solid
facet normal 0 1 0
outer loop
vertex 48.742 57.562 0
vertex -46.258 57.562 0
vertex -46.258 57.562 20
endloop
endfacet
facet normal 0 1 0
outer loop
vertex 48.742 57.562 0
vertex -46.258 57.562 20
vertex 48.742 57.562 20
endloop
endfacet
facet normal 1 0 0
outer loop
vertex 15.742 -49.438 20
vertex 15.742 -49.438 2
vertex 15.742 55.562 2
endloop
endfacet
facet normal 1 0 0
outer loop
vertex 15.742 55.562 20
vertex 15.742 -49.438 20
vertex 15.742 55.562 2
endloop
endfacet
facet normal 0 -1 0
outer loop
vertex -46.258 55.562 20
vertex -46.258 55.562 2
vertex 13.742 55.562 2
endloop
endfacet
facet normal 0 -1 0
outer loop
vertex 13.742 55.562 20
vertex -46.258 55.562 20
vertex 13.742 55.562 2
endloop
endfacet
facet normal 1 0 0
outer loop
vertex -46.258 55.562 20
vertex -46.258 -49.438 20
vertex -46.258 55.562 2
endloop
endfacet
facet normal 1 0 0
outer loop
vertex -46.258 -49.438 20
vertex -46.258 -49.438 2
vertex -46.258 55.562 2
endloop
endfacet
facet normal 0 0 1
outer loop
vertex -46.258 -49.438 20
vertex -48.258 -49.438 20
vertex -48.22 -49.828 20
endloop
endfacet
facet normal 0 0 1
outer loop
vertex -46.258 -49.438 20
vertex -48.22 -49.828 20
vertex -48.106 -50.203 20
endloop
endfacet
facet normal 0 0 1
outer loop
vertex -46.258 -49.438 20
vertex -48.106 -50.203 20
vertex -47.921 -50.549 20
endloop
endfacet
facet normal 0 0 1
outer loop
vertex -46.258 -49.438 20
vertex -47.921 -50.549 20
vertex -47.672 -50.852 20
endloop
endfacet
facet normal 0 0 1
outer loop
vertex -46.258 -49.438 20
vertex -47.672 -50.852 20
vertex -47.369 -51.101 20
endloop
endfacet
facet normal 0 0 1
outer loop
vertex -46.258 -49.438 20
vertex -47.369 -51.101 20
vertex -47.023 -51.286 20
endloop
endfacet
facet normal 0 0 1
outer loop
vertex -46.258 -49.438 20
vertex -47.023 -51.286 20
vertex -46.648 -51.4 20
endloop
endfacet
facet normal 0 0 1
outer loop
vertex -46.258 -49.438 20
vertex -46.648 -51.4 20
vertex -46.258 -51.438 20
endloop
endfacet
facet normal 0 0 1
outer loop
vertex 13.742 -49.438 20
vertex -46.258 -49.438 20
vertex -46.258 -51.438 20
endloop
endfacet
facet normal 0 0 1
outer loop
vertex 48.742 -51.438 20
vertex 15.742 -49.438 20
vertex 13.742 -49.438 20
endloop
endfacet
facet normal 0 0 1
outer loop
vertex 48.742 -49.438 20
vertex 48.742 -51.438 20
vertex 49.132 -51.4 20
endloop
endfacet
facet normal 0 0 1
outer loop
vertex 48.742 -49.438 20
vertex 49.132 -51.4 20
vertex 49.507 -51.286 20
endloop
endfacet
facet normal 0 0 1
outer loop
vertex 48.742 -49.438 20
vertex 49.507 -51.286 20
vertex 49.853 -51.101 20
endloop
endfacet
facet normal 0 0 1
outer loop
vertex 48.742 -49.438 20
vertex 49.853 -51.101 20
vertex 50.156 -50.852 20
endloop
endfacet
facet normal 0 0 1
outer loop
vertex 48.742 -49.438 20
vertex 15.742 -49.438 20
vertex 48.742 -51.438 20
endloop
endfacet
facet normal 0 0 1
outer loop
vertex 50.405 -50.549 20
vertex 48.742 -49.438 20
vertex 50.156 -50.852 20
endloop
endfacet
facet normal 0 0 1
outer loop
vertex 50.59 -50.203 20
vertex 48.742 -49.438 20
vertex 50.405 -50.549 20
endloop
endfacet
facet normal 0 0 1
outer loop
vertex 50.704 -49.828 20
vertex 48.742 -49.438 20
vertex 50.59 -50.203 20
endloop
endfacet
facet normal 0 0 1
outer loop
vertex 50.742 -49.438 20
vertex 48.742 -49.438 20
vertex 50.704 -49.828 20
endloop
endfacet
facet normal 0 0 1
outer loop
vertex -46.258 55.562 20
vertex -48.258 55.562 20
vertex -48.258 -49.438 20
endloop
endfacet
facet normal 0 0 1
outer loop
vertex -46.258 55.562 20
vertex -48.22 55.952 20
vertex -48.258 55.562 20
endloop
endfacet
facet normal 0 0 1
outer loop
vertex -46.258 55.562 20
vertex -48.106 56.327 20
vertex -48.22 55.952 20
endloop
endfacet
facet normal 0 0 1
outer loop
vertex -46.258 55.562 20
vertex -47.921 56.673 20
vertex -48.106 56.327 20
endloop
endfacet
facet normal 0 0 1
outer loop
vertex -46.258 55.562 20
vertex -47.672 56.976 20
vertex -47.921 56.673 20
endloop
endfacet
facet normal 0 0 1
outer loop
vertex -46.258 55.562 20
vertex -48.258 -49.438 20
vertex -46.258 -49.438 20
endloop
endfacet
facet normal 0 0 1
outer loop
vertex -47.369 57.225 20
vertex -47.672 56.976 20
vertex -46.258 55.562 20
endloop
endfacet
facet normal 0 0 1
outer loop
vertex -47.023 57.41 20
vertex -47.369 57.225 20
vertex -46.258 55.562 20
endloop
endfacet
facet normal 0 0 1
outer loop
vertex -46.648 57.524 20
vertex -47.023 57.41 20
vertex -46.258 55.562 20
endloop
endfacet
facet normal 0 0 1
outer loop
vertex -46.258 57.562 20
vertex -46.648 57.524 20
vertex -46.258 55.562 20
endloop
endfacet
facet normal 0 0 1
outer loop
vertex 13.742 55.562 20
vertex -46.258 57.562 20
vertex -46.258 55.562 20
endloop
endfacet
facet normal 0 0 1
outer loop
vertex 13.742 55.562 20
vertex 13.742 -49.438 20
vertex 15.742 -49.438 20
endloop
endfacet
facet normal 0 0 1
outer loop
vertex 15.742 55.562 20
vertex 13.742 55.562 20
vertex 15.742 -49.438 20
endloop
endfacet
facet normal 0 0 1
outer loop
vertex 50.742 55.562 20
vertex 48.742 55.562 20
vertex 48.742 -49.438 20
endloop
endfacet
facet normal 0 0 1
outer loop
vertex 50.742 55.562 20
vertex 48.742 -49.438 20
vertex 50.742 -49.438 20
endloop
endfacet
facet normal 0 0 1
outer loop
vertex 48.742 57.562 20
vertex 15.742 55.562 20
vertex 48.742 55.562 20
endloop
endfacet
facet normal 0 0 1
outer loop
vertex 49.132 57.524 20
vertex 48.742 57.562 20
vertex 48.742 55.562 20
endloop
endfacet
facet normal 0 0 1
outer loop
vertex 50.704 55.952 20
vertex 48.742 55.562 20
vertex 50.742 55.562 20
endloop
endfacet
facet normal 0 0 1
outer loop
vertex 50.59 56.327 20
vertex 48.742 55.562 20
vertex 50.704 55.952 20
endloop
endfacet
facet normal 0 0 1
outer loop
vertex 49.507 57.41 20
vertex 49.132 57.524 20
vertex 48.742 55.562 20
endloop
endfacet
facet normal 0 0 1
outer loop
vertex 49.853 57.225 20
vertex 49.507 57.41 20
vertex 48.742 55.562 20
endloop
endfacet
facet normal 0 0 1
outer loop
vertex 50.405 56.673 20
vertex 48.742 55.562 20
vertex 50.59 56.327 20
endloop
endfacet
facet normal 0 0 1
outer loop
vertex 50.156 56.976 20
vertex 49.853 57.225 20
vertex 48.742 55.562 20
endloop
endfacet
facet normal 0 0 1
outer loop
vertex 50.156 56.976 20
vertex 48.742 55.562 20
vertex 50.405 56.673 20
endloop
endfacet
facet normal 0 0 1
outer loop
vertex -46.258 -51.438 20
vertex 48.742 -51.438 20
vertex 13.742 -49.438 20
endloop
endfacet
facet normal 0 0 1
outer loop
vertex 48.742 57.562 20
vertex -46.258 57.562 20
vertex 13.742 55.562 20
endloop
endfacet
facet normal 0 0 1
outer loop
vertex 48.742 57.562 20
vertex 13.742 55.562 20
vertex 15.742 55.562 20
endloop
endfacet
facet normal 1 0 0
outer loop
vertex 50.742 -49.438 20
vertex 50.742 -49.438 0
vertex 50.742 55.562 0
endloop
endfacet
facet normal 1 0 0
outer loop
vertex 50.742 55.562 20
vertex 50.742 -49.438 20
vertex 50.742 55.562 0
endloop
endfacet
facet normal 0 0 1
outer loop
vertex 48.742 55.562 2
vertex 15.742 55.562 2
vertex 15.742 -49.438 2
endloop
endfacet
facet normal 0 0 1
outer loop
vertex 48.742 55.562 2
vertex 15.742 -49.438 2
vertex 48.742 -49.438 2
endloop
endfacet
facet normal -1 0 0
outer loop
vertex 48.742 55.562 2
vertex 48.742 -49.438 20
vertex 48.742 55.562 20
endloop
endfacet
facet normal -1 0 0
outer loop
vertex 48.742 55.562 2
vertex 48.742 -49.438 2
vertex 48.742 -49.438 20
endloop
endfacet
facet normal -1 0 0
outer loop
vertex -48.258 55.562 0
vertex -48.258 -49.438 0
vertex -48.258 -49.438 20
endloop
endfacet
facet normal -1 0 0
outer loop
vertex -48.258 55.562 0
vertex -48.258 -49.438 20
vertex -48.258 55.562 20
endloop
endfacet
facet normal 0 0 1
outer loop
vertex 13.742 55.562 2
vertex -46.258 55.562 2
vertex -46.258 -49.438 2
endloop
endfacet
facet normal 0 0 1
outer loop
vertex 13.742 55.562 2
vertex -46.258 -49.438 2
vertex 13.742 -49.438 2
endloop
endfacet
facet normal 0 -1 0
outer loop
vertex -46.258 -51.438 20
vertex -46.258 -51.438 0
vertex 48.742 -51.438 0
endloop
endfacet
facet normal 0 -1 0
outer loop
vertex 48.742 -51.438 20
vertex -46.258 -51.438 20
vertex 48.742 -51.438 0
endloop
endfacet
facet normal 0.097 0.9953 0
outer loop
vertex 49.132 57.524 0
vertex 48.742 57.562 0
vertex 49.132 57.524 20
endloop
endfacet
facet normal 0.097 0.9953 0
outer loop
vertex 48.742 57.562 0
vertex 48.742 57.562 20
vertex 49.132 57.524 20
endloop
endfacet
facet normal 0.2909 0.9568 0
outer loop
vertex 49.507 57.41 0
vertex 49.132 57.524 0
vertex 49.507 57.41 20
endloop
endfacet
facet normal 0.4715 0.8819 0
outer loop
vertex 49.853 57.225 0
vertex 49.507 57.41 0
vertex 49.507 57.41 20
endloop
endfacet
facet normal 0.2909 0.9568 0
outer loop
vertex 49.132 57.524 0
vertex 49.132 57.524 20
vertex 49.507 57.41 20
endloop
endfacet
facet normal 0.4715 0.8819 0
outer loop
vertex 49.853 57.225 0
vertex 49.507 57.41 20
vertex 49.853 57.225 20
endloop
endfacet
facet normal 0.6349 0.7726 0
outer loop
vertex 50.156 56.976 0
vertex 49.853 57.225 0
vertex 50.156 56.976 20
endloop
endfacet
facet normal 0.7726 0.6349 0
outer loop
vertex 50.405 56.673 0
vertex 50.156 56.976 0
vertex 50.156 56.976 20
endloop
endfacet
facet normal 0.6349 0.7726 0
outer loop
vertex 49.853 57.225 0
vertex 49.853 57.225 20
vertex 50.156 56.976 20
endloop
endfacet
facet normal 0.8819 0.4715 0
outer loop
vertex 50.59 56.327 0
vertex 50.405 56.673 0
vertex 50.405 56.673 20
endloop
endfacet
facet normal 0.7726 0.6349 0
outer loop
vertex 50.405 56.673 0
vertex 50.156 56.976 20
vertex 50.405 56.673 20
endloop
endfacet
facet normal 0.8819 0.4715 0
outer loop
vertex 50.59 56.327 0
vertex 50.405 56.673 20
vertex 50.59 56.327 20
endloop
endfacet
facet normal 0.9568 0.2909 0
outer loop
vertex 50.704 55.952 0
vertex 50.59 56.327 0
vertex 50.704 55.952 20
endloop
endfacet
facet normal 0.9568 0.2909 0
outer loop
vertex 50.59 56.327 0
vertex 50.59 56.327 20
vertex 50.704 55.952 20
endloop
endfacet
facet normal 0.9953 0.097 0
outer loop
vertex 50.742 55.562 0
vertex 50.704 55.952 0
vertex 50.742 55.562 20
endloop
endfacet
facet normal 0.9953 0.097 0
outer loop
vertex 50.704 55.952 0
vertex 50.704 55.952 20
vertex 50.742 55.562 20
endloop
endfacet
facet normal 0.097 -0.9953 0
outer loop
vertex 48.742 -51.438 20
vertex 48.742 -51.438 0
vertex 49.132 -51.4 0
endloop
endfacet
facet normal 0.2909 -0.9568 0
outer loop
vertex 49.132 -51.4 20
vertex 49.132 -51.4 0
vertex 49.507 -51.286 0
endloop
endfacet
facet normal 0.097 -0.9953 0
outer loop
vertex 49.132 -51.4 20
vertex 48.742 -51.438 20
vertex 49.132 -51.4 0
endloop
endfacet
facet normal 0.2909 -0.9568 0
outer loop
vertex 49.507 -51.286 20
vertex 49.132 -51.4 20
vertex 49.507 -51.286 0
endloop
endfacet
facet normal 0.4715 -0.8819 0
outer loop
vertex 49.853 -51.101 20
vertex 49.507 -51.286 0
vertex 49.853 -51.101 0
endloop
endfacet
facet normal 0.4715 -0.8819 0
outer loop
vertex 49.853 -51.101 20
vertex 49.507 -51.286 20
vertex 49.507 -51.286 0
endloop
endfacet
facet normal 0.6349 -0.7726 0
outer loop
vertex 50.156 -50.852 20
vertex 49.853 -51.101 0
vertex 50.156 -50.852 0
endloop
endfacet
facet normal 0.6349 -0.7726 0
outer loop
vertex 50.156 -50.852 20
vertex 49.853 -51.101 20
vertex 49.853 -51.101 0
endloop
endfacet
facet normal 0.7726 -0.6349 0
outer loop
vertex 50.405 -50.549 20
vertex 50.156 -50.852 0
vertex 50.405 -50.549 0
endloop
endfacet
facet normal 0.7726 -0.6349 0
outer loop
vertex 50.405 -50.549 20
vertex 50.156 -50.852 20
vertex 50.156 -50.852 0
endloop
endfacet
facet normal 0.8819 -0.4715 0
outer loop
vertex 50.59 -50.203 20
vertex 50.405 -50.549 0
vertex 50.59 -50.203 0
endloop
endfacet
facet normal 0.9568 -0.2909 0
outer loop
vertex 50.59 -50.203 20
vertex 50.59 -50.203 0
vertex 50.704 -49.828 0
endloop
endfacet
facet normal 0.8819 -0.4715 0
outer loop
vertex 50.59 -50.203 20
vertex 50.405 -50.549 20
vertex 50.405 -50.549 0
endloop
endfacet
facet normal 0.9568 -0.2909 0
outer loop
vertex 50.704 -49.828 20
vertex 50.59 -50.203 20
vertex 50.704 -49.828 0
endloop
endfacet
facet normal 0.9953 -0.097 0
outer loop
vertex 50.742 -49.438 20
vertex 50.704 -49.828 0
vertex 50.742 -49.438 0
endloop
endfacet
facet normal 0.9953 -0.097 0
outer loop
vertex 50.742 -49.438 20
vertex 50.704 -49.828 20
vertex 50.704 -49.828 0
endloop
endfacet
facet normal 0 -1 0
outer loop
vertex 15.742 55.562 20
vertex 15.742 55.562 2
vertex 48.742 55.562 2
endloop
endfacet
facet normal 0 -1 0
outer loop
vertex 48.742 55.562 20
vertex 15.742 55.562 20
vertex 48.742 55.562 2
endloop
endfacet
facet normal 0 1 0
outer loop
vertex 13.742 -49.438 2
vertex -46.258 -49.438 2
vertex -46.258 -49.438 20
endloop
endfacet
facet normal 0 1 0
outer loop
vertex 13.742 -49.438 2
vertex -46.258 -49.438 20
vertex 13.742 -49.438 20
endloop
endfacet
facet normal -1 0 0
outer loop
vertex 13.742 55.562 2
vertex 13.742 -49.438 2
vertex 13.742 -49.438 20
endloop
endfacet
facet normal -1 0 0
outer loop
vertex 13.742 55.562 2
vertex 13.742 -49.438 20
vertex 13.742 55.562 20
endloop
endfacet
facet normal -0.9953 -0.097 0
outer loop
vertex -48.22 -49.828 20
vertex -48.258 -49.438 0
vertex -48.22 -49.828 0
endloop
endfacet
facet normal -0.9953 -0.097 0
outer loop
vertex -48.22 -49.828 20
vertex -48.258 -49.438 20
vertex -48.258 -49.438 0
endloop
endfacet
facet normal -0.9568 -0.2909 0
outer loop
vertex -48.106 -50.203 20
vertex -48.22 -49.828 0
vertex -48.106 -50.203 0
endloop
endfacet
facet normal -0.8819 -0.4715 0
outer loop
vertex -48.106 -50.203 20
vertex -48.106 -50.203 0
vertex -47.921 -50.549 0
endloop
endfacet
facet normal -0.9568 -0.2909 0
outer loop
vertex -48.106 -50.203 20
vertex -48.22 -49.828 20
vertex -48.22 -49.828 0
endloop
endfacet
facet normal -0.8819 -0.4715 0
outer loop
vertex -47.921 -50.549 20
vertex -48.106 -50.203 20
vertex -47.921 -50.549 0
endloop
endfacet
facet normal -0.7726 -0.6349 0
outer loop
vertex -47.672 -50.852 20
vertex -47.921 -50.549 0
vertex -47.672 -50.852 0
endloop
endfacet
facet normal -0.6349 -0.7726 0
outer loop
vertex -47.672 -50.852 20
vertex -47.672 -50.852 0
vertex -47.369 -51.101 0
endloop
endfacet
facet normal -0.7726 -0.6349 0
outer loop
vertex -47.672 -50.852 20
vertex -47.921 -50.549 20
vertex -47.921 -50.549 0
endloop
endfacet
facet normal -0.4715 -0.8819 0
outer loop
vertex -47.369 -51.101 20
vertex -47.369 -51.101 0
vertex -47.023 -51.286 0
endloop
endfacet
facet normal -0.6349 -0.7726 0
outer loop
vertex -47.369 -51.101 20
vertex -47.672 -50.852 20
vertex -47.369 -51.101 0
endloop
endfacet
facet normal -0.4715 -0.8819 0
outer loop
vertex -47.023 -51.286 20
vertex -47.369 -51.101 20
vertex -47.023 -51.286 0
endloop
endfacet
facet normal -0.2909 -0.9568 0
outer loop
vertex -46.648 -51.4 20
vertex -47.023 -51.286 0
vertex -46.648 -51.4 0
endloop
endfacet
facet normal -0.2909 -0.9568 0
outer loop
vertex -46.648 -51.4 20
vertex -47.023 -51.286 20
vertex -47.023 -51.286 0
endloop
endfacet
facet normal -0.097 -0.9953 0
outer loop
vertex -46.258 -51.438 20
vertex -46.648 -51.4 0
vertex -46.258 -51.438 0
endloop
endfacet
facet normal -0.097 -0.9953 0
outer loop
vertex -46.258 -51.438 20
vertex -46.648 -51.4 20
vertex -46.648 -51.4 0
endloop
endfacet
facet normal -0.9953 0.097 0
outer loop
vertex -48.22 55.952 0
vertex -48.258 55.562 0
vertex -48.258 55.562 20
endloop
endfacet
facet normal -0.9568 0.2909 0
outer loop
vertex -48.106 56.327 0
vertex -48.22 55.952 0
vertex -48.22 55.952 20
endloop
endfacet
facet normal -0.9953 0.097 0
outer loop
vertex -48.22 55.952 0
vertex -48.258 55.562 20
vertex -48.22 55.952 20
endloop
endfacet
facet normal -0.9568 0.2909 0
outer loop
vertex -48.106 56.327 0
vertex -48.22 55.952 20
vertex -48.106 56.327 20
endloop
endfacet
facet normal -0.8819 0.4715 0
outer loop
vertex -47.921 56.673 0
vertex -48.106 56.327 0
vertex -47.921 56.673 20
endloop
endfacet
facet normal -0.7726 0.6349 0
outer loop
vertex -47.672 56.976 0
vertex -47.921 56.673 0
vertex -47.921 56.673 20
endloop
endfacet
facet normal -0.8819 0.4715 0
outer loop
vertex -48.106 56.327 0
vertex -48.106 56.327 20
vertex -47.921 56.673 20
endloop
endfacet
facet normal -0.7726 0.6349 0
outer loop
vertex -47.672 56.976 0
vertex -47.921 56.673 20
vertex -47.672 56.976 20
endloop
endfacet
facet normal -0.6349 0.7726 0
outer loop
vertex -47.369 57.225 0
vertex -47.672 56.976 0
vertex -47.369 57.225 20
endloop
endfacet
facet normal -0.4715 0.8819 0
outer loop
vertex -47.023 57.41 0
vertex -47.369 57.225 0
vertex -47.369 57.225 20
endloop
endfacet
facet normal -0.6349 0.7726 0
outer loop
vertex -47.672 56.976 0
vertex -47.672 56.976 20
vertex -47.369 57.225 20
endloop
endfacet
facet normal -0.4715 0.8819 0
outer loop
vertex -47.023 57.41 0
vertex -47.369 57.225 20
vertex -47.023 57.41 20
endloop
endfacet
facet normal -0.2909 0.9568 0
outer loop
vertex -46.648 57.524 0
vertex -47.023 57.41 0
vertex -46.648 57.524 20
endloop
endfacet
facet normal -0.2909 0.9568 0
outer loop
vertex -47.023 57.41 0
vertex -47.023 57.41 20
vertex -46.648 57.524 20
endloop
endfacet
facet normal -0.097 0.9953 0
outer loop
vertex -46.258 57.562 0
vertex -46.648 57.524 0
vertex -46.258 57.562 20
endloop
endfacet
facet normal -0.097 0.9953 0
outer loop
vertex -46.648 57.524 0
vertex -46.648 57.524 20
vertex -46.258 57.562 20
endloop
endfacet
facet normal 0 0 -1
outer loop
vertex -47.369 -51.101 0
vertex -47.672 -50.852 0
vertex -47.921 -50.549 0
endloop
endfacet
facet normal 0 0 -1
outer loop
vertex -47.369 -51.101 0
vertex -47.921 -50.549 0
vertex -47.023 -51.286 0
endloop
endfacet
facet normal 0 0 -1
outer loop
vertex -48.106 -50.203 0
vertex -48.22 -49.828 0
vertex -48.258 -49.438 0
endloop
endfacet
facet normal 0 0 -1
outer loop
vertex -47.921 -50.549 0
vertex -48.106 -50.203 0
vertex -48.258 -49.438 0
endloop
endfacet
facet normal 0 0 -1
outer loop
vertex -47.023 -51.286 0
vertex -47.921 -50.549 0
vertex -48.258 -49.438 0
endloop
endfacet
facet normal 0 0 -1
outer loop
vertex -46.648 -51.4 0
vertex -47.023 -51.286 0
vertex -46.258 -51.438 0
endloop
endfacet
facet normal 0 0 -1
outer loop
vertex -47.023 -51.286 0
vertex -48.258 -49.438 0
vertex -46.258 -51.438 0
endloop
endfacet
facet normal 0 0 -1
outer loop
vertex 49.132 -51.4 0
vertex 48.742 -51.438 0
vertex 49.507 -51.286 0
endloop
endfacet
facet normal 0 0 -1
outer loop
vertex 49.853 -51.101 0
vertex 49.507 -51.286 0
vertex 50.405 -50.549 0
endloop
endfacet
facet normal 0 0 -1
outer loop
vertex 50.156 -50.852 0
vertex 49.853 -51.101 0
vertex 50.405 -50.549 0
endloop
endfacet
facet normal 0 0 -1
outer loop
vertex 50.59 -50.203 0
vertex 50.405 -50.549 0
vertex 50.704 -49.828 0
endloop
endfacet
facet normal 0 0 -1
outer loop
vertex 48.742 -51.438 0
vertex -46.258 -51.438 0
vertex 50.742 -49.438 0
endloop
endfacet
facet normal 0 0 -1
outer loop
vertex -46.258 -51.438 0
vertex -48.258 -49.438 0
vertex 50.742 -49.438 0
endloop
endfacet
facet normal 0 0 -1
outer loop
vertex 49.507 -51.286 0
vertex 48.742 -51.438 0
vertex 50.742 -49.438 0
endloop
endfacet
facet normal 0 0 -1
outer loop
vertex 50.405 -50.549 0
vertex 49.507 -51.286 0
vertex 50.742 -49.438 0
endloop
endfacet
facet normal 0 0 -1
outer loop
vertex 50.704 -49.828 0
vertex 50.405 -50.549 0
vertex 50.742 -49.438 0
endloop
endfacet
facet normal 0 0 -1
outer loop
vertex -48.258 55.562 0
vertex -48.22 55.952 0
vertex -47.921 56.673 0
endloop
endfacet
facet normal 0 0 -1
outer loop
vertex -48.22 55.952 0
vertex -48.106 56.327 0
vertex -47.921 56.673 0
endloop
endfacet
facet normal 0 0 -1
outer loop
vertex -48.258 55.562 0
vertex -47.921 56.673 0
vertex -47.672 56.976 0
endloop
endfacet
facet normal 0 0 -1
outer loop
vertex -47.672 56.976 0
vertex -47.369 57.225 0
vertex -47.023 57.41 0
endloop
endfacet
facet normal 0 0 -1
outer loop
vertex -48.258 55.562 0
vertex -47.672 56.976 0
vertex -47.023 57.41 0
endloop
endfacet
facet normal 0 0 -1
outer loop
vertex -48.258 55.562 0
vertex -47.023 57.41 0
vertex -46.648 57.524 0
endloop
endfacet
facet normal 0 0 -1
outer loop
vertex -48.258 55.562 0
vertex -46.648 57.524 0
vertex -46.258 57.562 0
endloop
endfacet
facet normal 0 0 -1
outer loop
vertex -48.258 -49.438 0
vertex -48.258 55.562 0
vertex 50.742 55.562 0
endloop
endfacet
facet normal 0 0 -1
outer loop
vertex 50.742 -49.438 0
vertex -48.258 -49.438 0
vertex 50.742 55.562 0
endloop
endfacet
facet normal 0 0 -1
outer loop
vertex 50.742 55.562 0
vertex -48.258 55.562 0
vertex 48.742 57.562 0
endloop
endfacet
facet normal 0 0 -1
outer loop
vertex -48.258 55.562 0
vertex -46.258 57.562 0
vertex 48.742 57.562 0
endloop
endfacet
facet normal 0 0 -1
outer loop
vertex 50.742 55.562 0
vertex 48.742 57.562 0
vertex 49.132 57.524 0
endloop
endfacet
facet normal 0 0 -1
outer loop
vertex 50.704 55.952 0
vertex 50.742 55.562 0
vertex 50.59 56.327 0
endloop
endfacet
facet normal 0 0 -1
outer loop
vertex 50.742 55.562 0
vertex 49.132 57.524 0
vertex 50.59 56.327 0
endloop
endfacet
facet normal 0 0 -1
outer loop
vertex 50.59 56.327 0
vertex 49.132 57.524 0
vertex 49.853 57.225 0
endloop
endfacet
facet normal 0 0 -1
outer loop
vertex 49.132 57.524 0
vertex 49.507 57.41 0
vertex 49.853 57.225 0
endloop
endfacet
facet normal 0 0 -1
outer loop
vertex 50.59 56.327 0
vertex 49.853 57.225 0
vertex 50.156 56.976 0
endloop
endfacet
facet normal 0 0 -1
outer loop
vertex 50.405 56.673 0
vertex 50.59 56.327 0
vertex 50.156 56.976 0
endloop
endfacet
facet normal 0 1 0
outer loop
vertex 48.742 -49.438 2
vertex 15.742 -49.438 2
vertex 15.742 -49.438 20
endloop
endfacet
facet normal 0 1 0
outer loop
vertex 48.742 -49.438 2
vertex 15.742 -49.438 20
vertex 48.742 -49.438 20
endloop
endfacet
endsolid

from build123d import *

# Parameters (mm, degrees)
F0_W     = 99
F0_H     = 109
F1_DEPTH = 20
F2_T     = -2
F3_W     = 2
F3_H     = 105
F4_DEPTH = 18
F5_R     = 2


with BuildPart() as f1:
    # F0 (on Top) → F1 (new body)
    with BuildSketch(Plane.XY):
        with Locations((1.24195, 3.062002)):
            Rectangle(F0_W, F0_H)
    extrude(amount=F1_DEPTH)

    # F2
    f2_openings = [f1.faces().sort_by_distance(p)[0] for p in [
        (1.24195, 3.062002, 20),
    ]]
    offset(amount=F2_T, openings=f2_openings)

    # F3 (on face) → F4 (join, through all)
    with BuildSketch(Plane.XY.offset(2)):
        with Locations((14.74195, 3.062002)):
            Rectangle(F3_W, F3_H)
    extrude(amount=F4_DEPTH)

    # F5
    f5_edges = [f1.edges().sort_by_distance(p)[0] for p in [
        (-48.25805, 57.562002, 10),
        (-48.25805, -51.437998, 10),
        (50.74195, -51.437998, 10),
        (50.74195, 57.562002, 10),
    ]]
    fillet(f5_edges, radius=F5_R)


solid = f1.part
